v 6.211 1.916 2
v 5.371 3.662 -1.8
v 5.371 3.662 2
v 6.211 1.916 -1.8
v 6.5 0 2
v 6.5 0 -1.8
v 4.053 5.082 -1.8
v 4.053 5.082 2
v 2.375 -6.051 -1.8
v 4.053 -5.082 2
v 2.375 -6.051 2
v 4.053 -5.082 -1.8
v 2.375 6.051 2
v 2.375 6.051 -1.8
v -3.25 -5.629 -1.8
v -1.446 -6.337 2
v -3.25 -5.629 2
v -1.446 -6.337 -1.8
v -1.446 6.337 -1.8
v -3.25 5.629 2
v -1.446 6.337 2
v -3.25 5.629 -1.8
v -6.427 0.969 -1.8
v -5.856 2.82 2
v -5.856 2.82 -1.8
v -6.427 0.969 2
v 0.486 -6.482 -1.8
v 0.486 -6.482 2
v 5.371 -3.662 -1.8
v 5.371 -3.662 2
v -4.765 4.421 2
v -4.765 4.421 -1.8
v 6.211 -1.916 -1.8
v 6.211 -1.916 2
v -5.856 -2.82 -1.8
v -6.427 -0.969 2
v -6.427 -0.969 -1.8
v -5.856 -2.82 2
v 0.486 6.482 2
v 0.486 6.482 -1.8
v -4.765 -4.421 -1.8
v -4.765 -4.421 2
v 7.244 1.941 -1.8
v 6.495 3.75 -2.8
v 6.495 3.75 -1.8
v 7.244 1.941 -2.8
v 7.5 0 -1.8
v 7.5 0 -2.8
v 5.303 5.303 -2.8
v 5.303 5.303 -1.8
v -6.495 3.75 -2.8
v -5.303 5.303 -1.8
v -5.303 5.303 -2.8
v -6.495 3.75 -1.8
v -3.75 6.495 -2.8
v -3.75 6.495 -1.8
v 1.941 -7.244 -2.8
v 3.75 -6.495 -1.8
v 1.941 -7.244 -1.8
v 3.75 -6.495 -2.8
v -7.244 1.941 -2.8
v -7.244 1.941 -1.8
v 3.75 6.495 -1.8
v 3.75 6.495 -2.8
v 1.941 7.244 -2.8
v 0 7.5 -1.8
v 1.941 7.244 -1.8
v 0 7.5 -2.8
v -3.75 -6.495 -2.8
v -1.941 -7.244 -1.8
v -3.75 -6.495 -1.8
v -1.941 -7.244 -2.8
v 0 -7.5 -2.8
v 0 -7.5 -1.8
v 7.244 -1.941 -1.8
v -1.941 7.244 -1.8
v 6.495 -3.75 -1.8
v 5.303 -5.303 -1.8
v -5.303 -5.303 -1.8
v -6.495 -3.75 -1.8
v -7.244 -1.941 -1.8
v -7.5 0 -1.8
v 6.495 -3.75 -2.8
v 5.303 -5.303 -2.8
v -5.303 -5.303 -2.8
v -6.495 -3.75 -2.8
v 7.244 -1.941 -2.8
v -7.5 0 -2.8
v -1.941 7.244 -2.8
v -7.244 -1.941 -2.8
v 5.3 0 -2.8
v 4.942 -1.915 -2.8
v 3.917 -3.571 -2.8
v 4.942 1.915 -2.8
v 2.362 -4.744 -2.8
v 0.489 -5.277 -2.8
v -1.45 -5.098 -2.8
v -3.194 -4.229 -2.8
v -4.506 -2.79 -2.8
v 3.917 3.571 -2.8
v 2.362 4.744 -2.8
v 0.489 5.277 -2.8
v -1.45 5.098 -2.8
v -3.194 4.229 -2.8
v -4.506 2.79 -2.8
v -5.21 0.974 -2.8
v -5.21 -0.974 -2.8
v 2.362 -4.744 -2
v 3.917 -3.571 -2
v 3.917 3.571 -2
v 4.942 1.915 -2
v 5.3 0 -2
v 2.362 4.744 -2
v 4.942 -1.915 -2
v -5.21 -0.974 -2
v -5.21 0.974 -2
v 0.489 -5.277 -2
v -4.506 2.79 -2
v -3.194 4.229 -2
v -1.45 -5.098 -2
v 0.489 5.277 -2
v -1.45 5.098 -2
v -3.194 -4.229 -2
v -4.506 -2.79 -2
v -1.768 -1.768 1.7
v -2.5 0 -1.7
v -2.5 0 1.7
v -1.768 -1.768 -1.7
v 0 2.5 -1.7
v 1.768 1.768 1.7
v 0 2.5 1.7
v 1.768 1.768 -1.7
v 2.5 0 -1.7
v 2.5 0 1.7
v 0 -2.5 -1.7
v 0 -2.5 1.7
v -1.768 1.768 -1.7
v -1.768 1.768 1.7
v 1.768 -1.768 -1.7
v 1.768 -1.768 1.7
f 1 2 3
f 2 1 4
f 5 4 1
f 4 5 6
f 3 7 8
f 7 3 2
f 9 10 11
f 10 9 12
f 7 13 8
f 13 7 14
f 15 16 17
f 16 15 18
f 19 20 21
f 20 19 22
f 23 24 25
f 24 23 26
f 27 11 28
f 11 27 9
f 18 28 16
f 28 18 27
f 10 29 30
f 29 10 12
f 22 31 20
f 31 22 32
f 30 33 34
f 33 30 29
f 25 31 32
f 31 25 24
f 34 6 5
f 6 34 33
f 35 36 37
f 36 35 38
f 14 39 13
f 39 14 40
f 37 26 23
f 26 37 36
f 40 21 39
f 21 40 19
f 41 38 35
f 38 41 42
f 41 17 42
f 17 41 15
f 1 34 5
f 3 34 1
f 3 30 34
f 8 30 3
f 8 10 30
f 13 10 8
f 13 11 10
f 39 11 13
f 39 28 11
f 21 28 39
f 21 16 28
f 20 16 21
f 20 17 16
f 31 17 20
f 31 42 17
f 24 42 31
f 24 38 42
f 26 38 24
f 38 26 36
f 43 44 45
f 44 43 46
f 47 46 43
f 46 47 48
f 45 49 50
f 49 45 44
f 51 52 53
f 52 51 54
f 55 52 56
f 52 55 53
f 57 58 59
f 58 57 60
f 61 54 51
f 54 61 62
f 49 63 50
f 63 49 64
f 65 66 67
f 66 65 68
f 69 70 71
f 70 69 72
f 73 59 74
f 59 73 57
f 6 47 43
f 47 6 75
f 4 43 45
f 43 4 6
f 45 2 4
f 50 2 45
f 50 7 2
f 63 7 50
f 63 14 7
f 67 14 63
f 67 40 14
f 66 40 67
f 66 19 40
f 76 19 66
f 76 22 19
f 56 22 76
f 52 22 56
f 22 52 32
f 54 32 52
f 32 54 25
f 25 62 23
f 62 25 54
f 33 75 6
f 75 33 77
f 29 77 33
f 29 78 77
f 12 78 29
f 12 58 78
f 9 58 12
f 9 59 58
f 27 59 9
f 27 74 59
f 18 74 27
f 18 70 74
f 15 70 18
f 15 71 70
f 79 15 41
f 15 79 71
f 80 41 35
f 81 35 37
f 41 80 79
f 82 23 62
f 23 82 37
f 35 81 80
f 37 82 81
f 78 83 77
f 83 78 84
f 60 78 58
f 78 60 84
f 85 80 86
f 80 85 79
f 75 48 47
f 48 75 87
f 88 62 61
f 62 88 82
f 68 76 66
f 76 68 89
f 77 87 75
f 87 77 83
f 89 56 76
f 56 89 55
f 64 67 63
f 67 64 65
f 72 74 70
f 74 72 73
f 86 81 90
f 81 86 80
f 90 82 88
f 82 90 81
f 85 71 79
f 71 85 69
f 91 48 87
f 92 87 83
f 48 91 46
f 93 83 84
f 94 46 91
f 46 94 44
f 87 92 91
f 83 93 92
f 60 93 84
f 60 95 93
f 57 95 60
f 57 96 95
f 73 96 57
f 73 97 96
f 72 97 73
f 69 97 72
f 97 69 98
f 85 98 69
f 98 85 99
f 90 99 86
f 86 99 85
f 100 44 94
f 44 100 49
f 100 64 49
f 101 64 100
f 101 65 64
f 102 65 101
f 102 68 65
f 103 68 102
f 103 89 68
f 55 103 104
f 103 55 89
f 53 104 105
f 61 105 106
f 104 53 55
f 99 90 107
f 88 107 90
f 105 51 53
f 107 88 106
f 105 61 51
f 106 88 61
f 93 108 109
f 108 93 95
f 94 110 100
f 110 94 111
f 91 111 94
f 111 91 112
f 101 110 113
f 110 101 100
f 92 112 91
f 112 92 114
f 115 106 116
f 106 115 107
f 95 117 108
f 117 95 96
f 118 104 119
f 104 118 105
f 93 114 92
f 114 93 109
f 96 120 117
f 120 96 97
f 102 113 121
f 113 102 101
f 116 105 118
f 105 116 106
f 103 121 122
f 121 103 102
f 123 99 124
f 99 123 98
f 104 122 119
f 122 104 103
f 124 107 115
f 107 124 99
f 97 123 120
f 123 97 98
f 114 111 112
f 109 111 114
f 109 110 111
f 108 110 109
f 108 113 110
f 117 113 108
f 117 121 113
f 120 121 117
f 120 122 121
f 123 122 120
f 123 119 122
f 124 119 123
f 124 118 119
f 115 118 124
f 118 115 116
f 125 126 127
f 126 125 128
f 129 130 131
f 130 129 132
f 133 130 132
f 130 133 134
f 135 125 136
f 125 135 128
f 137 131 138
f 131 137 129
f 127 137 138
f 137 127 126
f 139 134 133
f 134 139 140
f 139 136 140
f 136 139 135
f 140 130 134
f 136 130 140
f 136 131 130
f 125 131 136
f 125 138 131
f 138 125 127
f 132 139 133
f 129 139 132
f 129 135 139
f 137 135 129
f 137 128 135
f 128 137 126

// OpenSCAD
// Parameters
bore_diameter_mm = 5.0; //[2.5:10.0:0.1]
outer_diameter_mm = 13.0; //[6.5:26.0:0.1]
width_mm = 4.0; //[2.0:8.0:0.1]
flange_diameter_mm = 15.0; //[7.5:30.0:0.1]
flange_width_mm = 1.0; //[0.5:2.0:0.1]
outer_race_rim_thickness_mm = 1.2; //[0.6:2.4:0.1]
inner_race_hub_thickness_mm = 1.2; //[0.6:2.4:0.1]
chamfer_mm = 0.3; //[0.15:0.6:0.05]
shield_band_thickness_mm = 0.6; //[0.3:1.2:0.05]
shield_band_axial_clearance_mm = 0.5; //[0.2:1.0:0.05]
ball_diameter_mm = 2.0; //[1.0:4.0:0.1]
overlap_mm = 0.8; //[0.5:2.0:0.1]

// Ball Bearing - complete geometry
module ball_bearing() {
  color("Silver") {
    // Outer race with flange
    difference() {
      union() {
        // Outer race ring
        cylinder(r=outer_diameter_mm/2, h=width_mm, center=true);
        // Flange
        translate([0, 0, (-width_mm/2) + (flange_width_mm/2) - overlap_mm])
          cylinder(r=flange_diameter_mm/2, h=flange_width_mm, center=true);
      }
      // Inner bore of outer race
      cylinder(r=outer_diameter_mm/2 - outer_race_rim_thickness_mm, h=width_mm + 2*overlap_mm, center=true);
    }
    
    // Inner race
    difference() {
      cylinder(r=bore_diameter_mm/2 + inner_race_hub_thickness_mm, h=width_mm, center=true);
      cylinder(r=bore_diameter_mm/2, h=width_mm + 2*overlap_mm, center=true);
    }
    
    // Shield or seal band
    difference() {
      cylinder(r=outer_diameter_mm/2 - outer_race_rim_thickness_mm + overlap_mm, h=width_mm - shield_band_axial_clearance_mm, center=true);
      cylinder(r=bore_diameter_mm/2 + inner_race_hub_thickness_mm - overlap_mm, h=width_mm - shield_band_axial_clearance_mm + 2*overlap_mm, center=true);
    }
    
    // Chamfers
    union() {
      translate([0, 0, width_mm/2 - chamfer_mm/2])
        cylinder(r=outer_diameter_mm/2, h=chamfer_mm, center=true);
      translate([0, 0, -width_mm/2 + chamfer_mm/2])
        cylinder(r=outer_diameter_mm/2, h=chamfer_mm, center=true);
      translate([0, 0, width_mm/2 - chamfer_mm/2])
        cylinder(r=bore_diameter_mm/2 + inner_race_hub_thickness_mm, h=chamfer_mm, center=true);
      translate([0, 0, -width_mm/2 + chamfer_mm/2])
        cylinder(r=bore_diameter_mm/2 + inner_race_hub_thickness_mm, h=chamfer_mm, center=true);
    }
  }
}

// Bearing Ball - complete geometry
module bearing_ball() {
  color("Copper") {
    translate([(bore_diameter_mm/2 + inner_race_hub_thickness_mm) + ((outer_diameter_mm/2 - outer_race_rim_thickness_mm) - (bore_diameter_mm/2 + inner_race_hub_thickness_mm))/2, 0, 0])
      sphere(r=ball_diameter_mm/2);
  }
}

// Assembly
module assembly() {
  ball_bearing();
  bearing_ball();
}

assembly();
